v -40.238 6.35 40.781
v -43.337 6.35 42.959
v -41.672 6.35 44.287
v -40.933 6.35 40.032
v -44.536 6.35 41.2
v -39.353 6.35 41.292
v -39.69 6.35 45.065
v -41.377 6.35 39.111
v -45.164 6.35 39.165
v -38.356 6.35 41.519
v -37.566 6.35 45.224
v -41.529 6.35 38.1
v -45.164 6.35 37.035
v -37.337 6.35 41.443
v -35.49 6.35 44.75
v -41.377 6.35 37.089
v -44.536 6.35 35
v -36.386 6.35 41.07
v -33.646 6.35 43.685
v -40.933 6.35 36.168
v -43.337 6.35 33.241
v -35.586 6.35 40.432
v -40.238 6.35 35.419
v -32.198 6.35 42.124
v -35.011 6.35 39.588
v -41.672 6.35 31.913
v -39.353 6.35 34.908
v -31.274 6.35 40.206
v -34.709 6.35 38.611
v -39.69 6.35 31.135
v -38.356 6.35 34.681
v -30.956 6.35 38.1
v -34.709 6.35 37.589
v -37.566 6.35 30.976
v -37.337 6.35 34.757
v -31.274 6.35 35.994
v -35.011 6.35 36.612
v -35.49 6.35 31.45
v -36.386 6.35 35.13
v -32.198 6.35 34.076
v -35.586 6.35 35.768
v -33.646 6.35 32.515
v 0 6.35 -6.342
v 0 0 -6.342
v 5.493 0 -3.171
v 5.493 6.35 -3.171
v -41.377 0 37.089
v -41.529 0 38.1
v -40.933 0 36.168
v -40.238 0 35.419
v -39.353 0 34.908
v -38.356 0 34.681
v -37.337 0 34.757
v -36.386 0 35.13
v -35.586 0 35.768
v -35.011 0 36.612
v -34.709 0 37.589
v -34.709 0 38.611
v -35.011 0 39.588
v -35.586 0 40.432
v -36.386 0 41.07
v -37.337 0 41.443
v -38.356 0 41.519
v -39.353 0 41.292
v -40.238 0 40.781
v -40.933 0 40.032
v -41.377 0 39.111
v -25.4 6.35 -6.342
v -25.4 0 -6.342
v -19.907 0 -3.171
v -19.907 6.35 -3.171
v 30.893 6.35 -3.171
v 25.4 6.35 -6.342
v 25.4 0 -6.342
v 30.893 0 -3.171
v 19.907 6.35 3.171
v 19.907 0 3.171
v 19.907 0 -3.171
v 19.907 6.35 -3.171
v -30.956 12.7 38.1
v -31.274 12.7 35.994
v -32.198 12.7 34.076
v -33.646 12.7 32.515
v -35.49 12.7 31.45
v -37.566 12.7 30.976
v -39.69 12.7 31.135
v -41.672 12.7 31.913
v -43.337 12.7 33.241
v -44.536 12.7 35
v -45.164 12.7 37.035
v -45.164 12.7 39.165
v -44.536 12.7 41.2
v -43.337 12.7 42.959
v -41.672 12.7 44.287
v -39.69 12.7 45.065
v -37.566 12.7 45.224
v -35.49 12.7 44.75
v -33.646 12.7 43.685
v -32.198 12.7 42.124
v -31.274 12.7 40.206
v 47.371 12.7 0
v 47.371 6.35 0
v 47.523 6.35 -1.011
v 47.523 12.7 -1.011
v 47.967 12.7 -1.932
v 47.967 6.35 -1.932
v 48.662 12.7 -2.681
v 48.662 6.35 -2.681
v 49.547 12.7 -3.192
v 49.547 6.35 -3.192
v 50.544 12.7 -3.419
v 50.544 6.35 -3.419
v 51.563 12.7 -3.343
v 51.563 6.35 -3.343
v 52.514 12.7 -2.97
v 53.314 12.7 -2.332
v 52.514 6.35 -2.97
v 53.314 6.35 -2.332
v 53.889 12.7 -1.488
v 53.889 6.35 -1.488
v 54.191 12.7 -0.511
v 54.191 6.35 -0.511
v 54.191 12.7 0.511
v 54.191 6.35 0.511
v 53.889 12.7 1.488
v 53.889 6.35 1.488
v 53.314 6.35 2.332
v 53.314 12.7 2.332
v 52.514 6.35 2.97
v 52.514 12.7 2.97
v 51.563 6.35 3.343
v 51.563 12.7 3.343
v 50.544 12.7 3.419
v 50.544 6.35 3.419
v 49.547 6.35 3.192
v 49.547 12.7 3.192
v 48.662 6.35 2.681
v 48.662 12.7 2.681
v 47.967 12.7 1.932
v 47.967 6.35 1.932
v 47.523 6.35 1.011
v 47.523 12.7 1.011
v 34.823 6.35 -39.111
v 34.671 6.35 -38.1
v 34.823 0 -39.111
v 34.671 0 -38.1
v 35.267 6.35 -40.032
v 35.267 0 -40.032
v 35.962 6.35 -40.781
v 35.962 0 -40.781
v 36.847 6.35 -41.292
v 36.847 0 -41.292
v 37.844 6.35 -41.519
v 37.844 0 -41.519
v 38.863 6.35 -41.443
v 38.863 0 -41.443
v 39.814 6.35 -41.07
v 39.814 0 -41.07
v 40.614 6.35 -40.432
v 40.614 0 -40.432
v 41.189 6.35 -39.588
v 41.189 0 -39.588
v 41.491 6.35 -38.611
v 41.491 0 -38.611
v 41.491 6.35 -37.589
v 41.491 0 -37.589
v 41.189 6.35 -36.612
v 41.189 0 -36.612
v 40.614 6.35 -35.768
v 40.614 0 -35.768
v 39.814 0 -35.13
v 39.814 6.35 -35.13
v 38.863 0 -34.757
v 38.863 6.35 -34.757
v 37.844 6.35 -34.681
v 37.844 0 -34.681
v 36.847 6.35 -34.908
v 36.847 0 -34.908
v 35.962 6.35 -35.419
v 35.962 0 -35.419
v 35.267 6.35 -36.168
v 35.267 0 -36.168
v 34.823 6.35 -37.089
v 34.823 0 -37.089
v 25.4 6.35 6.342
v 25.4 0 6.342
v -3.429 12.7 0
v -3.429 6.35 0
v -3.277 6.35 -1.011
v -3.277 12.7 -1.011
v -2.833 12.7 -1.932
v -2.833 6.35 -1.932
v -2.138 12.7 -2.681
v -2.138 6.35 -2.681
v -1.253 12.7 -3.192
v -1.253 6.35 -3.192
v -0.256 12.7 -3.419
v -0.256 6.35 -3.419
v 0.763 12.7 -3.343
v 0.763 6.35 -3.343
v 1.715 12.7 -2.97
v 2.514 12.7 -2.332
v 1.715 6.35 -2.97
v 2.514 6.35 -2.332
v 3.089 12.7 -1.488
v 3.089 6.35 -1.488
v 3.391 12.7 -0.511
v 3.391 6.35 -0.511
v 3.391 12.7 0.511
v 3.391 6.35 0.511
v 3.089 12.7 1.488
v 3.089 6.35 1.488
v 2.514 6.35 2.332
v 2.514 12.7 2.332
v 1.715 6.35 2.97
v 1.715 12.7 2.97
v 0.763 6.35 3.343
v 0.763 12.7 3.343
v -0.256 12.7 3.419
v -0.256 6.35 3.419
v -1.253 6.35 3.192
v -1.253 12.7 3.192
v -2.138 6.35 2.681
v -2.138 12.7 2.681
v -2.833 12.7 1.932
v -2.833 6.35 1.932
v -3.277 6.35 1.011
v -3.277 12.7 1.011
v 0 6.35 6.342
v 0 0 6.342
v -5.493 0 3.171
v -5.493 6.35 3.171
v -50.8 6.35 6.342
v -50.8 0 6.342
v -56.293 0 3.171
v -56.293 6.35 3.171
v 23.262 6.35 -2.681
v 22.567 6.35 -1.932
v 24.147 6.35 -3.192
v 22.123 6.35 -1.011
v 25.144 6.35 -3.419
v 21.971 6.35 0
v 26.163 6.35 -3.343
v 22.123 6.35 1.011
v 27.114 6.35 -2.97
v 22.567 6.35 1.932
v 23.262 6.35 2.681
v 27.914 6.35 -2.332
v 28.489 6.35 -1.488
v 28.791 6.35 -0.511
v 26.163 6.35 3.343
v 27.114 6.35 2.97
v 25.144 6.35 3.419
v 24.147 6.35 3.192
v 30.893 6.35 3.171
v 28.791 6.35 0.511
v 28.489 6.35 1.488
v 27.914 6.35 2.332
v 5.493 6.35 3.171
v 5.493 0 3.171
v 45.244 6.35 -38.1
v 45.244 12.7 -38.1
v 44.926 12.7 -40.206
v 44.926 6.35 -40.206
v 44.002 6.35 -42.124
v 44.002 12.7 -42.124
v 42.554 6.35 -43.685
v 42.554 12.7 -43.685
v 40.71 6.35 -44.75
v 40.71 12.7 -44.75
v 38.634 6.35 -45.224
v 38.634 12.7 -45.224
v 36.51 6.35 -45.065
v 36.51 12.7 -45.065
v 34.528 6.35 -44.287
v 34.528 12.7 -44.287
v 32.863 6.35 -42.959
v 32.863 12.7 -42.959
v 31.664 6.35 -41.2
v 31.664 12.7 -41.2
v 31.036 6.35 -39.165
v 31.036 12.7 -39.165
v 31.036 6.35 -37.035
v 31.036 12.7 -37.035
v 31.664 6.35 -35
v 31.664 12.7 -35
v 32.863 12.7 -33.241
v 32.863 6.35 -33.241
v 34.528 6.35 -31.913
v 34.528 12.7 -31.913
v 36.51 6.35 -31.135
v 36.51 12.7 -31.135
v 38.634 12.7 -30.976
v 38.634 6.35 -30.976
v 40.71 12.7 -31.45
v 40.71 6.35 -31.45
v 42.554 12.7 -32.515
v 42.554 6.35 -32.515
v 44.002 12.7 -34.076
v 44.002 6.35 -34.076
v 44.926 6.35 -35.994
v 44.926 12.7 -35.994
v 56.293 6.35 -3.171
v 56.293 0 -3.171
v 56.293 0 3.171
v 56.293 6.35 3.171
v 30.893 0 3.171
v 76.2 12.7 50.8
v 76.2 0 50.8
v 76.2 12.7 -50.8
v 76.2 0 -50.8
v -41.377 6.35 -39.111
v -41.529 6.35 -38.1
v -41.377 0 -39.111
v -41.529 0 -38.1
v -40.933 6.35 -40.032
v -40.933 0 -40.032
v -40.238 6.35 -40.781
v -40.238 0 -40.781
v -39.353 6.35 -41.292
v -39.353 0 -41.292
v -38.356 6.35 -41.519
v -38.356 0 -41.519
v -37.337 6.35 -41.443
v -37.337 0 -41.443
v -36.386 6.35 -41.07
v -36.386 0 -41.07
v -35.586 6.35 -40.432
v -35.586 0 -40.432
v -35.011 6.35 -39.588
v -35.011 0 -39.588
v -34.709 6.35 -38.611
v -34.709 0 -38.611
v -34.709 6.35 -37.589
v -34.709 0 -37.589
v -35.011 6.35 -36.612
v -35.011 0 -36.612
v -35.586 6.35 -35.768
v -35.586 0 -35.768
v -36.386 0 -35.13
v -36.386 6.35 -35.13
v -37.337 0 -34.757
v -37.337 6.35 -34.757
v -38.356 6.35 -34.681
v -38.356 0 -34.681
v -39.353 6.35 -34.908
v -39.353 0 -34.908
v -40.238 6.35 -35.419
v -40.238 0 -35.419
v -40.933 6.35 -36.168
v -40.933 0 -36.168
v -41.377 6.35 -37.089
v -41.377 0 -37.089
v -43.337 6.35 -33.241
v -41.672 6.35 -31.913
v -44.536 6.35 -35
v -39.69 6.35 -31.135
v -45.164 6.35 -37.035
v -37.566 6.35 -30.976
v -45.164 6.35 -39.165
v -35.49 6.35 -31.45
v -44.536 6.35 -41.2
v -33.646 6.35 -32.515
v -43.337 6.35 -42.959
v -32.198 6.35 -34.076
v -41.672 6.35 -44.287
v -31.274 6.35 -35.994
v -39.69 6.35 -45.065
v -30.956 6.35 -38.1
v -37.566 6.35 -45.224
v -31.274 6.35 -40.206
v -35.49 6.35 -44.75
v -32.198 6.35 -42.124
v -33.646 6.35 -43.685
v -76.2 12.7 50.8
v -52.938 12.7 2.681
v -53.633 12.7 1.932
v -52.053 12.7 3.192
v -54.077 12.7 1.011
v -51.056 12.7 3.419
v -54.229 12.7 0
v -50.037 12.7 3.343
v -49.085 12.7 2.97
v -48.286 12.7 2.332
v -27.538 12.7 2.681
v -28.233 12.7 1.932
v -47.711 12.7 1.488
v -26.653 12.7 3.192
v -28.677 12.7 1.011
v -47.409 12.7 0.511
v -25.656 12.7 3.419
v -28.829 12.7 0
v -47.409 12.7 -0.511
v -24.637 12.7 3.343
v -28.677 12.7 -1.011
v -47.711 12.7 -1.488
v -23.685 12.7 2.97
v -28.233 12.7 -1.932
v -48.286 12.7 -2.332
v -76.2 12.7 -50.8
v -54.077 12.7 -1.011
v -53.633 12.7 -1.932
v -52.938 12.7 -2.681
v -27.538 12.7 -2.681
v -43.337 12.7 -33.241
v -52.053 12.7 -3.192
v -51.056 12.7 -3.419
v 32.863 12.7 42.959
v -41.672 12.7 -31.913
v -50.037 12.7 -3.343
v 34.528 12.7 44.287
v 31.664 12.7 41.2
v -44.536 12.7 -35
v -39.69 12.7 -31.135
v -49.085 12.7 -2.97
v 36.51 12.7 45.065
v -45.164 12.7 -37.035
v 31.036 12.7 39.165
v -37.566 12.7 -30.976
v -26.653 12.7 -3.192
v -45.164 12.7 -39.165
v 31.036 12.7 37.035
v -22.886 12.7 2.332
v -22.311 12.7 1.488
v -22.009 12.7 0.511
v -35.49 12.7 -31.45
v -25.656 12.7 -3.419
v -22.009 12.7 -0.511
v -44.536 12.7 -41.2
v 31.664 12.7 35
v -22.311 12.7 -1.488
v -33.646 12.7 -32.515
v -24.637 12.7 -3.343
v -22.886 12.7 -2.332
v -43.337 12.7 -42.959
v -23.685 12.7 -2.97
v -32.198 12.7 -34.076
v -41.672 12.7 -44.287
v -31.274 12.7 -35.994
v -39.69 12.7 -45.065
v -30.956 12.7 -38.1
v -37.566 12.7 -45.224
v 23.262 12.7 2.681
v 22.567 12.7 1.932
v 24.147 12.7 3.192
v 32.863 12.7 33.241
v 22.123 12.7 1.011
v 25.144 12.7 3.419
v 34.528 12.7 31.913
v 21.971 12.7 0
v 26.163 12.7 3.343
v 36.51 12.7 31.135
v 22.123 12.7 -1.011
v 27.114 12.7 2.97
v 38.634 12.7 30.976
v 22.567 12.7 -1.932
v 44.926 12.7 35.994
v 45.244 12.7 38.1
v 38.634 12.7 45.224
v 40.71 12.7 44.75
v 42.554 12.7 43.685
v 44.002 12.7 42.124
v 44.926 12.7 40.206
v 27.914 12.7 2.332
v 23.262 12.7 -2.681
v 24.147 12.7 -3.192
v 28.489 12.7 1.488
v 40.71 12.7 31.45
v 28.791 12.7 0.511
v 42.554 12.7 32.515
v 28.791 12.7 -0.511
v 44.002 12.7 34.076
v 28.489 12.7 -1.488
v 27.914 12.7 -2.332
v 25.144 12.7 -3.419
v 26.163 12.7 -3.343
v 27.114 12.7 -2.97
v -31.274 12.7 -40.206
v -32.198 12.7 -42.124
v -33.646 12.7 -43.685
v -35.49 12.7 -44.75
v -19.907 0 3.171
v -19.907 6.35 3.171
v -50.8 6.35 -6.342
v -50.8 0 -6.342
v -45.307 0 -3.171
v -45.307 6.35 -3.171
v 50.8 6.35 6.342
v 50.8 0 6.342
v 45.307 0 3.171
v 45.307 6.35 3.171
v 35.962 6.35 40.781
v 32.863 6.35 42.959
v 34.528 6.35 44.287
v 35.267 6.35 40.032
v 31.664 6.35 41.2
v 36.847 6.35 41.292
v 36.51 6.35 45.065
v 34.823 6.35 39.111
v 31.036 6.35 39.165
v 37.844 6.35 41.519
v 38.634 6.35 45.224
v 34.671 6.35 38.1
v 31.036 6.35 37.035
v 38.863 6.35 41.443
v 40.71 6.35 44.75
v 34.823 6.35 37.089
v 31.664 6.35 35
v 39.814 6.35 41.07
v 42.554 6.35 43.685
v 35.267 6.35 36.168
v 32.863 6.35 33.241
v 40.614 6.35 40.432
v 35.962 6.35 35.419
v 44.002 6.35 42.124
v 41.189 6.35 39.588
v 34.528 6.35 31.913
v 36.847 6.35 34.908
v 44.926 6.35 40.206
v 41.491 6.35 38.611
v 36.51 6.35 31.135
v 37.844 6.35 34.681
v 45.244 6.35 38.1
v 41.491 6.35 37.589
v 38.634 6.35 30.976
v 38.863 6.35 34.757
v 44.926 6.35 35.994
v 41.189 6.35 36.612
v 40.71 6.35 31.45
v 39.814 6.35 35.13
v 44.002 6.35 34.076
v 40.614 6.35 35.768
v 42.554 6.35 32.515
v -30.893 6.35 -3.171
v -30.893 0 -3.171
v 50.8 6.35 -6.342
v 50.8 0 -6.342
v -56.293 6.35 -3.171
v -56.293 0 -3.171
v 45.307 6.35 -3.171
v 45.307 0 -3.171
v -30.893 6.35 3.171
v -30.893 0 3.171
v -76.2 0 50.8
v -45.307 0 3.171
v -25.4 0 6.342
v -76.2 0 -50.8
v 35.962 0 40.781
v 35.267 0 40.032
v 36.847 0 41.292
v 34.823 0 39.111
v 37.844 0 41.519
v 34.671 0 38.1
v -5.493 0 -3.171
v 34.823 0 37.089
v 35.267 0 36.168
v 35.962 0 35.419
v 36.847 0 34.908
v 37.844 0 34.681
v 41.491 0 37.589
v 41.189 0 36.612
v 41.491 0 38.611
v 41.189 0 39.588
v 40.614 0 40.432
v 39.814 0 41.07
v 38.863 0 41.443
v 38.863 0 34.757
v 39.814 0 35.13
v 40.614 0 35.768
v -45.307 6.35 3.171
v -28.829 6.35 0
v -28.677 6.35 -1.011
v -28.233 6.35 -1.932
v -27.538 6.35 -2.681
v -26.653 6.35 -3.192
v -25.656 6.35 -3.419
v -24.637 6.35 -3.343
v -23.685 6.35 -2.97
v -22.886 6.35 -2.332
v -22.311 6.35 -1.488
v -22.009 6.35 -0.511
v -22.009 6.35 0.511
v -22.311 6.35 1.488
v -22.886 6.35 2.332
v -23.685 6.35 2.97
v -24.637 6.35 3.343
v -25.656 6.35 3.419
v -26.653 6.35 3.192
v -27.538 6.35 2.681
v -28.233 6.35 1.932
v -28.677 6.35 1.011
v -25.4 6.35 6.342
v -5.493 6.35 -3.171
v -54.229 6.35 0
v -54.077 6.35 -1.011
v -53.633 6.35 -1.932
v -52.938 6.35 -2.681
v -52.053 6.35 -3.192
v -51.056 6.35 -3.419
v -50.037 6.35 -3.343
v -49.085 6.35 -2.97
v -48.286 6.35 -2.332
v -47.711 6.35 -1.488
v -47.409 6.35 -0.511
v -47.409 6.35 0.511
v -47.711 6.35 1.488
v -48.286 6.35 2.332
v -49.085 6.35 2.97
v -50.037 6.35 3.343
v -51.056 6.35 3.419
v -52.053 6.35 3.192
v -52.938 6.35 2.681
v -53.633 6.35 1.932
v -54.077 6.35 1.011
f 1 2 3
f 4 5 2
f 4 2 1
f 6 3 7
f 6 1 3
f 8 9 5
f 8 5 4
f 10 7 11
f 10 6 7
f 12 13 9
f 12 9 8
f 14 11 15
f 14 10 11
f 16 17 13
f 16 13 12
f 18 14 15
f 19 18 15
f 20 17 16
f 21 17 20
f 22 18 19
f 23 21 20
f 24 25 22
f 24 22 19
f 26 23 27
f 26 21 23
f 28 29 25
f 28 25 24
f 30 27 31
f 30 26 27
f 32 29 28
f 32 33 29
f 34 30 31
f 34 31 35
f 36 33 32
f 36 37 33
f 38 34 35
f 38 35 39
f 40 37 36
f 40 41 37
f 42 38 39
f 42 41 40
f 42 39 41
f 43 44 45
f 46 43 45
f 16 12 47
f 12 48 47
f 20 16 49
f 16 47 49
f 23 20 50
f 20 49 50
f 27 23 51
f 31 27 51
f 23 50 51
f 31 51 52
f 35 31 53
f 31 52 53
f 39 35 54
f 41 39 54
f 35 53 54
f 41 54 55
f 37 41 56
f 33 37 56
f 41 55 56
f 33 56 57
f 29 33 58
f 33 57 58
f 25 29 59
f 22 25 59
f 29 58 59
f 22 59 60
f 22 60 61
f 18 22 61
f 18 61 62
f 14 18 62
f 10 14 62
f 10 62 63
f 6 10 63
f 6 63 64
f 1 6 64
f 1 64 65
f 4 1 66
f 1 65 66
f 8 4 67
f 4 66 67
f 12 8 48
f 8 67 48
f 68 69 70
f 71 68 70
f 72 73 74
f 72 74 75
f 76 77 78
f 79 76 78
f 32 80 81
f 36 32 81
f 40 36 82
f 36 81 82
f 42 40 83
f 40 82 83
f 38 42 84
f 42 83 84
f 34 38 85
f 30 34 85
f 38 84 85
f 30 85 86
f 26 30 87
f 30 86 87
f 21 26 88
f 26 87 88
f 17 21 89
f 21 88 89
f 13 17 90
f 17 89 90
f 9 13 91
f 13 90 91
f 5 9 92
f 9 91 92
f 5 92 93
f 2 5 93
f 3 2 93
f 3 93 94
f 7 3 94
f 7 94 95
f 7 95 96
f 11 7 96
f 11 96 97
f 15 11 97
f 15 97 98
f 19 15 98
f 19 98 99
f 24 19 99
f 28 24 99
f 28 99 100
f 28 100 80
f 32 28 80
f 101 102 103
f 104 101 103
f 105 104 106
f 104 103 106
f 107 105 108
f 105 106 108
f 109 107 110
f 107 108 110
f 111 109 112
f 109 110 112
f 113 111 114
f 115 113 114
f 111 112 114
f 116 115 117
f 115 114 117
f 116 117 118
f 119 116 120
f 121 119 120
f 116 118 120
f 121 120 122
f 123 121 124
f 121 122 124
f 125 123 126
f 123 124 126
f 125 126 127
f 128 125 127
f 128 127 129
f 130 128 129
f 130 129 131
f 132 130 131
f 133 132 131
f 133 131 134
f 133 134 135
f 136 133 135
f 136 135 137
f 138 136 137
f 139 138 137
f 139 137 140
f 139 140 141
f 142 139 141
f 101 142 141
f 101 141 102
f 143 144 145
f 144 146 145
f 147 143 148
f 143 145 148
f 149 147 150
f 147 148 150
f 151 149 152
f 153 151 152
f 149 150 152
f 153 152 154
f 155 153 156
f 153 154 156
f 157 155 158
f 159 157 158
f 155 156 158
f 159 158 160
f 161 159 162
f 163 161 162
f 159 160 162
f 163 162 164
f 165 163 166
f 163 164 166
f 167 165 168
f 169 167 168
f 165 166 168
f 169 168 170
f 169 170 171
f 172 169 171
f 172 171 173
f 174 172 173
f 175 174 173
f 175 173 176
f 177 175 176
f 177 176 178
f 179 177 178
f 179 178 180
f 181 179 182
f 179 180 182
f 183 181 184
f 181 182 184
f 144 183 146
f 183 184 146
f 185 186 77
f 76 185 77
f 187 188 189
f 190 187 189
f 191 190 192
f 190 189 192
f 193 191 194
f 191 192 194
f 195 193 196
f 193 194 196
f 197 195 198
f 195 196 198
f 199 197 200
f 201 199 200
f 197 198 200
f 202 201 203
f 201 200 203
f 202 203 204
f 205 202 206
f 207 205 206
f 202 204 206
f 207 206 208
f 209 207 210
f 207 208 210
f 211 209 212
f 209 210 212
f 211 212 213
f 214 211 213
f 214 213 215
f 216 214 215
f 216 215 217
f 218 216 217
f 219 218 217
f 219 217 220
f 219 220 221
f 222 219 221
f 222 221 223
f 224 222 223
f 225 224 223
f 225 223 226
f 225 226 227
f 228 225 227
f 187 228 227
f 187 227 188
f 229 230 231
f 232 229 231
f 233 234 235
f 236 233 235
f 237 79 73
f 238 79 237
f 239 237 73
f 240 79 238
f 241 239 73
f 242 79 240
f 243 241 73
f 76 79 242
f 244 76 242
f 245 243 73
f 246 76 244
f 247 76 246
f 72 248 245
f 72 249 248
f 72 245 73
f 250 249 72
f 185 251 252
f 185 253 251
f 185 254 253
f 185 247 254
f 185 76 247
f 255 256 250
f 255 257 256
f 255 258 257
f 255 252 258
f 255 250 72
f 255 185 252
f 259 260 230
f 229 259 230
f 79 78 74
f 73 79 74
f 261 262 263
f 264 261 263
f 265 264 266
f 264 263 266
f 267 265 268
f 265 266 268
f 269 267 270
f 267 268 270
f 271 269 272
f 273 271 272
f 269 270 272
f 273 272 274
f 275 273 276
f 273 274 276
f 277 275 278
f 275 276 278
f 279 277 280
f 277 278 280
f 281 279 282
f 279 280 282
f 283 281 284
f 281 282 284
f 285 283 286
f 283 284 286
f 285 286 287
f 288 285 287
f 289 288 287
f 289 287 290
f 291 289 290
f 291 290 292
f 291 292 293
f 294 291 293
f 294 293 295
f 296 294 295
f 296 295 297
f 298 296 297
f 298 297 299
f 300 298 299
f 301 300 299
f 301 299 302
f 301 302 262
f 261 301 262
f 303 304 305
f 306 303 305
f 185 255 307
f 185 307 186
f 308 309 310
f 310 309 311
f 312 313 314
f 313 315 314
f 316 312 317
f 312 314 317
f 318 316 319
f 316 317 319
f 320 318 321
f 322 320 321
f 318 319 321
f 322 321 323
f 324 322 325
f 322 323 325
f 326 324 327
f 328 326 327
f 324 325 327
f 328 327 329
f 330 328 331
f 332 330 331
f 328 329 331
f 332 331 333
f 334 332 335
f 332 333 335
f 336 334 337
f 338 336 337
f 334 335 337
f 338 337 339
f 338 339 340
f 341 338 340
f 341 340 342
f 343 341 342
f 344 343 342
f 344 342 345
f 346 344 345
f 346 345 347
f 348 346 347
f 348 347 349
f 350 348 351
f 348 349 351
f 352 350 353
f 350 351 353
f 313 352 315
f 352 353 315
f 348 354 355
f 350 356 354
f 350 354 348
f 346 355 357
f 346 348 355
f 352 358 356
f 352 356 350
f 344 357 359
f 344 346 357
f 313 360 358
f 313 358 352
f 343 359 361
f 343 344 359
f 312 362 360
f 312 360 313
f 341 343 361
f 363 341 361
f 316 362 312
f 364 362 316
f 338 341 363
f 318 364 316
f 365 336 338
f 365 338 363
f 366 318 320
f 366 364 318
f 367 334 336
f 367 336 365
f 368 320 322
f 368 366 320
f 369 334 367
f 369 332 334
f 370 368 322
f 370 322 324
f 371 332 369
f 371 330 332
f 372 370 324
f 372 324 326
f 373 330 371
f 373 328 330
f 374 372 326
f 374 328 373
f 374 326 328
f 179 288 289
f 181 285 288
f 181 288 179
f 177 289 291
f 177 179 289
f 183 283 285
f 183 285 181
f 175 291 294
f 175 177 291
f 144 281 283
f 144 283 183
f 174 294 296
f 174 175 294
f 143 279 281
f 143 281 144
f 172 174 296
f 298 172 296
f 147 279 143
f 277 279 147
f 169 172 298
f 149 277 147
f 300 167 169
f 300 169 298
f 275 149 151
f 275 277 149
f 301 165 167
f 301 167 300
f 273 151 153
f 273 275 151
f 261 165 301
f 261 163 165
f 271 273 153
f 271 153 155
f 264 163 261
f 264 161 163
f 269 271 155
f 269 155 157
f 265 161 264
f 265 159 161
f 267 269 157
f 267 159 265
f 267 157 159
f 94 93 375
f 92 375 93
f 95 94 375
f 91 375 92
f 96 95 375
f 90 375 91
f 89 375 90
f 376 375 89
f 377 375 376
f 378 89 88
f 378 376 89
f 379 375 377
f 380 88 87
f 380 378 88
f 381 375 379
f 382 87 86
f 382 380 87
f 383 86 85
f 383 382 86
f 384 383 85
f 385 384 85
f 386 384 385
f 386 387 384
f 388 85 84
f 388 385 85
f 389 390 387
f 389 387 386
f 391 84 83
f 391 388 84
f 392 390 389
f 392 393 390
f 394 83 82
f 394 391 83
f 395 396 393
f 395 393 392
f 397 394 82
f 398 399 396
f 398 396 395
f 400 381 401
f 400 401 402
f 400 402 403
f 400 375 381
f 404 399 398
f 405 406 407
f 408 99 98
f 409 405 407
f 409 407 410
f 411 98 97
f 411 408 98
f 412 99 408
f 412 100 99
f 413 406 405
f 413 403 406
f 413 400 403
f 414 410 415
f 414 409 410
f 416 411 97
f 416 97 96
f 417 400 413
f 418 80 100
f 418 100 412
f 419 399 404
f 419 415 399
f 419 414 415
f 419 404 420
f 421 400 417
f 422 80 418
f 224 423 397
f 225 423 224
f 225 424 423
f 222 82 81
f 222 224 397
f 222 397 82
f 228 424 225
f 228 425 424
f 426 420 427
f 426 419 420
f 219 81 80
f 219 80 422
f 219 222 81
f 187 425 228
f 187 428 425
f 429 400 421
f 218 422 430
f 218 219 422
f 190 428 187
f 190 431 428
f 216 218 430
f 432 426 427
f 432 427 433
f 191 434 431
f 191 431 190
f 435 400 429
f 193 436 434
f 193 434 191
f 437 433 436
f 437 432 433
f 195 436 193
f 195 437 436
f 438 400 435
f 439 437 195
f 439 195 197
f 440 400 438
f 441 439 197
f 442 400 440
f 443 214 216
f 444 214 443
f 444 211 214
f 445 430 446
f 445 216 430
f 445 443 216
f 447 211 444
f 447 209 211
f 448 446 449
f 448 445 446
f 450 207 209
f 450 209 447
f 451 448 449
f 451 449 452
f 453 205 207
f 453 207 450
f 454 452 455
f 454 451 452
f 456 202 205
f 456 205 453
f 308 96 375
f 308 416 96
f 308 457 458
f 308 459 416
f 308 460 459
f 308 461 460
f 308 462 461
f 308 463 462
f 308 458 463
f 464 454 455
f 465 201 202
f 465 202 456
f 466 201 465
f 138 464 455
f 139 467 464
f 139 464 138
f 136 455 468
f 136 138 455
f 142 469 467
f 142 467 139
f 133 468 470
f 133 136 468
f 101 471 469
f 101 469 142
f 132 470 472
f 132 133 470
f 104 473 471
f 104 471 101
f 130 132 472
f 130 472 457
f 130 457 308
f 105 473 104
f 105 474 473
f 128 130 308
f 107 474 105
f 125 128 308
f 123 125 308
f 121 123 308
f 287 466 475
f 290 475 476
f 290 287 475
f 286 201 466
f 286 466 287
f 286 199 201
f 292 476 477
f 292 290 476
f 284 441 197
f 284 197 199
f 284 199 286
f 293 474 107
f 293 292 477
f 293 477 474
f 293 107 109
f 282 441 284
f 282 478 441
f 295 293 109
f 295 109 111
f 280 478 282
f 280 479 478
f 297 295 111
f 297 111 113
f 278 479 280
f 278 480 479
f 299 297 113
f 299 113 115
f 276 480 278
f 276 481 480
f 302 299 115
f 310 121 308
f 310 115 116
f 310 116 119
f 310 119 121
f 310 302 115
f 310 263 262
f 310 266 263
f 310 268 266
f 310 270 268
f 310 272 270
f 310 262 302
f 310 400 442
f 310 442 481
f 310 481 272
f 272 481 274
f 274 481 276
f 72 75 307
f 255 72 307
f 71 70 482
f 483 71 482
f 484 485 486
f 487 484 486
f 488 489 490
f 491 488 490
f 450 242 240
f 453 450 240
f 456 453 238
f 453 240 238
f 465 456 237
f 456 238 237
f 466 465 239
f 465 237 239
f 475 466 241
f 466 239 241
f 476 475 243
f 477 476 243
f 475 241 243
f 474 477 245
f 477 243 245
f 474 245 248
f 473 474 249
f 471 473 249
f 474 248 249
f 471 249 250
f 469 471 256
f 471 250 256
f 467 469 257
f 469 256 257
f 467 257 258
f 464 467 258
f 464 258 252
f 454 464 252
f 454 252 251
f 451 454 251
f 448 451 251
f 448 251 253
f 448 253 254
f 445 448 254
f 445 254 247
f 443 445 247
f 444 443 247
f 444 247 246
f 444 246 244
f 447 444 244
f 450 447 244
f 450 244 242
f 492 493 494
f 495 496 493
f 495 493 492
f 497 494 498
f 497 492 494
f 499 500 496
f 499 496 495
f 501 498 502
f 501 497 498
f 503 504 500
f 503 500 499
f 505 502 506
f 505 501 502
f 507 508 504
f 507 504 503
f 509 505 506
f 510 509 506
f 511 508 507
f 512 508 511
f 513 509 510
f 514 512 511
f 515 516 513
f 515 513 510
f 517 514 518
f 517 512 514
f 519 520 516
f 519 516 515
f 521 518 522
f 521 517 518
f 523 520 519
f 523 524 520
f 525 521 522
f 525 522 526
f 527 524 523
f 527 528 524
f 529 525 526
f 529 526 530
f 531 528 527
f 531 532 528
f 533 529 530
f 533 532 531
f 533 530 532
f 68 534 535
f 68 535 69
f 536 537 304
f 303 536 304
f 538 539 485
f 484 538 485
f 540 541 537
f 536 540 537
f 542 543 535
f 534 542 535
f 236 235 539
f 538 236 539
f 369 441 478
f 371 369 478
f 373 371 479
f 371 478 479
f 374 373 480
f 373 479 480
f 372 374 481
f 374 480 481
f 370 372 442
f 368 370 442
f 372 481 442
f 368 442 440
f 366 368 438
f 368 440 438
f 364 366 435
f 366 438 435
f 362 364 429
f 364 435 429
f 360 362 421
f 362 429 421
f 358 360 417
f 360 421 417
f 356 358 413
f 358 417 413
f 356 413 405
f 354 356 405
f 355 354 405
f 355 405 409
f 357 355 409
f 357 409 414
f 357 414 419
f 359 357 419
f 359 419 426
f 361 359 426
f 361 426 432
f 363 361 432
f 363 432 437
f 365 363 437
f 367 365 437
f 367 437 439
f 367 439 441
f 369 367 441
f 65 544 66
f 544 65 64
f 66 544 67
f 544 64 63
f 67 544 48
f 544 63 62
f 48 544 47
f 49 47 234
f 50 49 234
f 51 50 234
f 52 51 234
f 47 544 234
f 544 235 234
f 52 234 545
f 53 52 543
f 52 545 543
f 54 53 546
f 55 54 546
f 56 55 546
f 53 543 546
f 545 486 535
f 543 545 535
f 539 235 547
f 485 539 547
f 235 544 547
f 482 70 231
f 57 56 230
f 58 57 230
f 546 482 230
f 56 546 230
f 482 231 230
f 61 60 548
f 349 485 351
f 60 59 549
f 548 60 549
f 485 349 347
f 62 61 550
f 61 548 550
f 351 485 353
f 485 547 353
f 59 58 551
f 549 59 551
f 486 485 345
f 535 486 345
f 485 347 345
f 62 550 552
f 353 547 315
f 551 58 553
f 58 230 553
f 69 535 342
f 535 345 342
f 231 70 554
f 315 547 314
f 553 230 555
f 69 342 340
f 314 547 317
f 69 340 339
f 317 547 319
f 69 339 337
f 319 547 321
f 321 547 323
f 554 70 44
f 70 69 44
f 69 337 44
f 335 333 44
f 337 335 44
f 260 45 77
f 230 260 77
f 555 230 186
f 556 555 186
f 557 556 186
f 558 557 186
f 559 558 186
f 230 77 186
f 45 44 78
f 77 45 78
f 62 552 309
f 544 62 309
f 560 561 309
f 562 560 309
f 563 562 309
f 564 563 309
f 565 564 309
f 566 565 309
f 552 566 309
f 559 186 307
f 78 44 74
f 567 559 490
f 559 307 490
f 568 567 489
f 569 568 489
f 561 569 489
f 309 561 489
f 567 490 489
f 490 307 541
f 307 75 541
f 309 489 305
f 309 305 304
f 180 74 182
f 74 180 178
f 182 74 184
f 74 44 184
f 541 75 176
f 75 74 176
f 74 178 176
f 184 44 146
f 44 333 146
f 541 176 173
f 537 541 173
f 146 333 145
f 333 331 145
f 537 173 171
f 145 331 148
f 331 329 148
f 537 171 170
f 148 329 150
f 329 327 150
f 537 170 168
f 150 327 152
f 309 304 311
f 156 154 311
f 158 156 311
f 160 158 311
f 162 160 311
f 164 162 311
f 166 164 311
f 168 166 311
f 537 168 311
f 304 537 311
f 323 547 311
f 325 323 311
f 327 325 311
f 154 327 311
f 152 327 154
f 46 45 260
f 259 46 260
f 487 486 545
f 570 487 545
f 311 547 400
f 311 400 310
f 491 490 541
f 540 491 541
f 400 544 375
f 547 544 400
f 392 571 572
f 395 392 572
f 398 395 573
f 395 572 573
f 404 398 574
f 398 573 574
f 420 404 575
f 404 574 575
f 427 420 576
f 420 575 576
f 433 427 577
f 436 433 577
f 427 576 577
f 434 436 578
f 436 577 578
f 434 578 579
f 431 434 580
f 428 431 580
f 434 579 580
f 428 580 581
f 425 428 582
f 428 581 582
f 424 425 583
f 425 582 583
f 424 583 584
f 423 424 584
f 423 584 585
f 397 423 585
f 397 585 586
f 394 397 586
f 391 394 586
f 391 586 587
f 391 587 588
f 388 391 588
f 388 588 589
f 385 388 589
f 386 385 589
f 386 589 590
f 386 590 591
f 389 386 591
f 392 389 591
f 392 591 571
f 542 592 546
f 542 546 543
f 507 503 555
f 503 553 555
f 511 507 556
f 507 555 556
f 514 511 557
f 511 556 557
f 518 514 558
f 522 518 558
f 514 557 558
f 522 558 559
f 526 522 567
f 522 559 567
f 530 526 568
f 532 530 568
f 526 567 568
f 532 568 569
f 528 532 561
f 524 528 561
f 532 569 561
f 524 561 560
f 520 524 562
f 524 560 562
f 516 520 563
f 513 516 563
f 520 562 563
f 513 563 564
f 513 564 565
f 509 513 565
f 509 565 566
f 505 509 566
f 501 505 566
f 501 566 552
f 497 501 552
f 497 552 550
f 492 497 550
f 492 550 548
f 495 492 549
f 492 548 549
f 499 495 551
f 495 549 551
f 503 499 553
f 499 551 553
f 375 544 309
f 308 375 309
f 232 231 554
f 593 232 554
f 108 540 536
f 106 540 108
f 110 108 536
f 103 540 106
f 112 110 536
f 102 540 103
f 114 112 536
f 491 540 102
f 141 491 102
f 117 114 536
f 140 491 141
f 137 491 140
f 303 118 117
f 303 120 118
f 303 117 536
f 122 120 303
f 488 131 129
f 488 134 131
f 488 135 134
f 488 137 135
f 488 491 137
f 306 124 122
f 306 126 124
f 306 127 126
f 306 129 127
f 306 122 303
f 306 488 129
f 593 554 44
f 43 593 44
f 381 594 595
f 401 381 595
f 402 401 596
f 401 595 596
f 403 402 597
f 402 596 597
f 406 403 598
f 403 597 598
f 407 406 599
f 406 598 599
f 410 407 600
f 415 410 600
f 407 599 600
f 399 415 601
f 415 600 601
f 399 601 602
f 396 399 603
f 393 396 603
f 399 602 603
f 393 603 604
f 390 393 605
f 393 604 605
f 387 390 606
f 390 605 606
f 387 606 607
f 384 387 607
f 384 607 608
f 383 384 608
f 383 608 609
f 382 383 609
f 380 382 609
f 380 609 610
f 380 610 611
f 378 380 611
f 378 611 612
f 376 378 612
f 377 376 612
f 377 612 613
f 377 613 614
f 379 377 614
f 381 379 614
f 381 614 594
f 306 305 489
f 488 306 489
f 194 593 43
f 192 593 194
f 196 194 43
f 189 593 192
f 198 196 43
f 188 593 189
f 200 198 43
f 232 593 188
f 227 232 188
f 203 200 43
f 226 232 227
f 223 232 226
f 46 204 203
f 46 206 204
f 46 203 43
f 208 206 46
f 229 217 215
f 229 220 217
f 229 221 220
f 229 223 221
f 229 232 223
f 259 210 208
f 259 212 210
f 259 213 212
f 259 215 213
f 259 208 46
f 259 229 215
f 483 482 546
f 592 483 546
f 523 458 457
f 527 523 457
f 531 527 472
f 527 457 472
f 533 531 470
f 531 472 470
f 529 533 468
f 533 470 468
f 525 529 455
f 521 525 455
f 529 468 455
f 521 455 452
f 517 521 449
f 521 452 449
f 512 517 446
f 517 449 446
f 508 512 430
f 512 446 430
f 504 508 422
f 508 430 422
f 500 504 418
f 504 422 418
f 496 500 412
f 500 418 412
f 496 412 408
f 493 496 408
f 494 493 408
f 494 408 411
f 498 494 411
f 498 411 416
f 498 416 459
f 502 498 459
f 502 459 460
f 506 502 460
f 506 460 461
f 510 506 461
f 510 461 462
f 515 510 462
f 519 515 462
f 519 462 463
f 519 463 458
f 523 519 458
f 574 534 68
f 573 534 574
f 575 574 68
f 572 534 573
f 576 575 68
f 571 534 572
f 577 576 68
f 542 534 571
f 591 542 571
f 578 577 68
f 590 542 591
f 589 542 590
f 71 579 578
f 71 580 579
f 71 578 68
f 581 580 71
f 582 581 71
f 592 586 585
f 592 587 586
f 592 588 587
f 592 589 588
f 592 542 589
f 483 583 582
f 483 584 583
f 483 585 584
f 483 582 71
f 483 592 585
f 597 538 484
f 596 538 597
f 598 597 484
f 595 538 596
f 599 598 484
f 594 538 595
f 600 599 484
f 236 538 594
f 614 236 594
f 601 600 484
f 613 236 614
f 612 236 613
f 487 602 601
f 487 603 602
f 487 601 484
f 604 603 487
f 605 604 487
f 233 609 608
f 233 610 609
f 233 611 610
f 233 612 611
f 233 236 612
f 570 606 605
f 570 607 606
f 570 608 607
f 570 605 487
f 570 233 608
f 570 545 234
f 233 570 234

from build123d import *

# Parameters (mm, degrees)
SKETCH1_W                                            = 152.4
SKETCH1_H                                            = 101.6
BOSS_EXTRUDE1_DEPTH                                  = 12.7
CBORE_FOR_1_4_BINDING_HEAD_MACHINE_SCREW_D           = 6.858
CBORE_FOR_1_4_BINDING_HEAD_MACHINE_SCREW_CBORE_D     = 14.2875
CBORE_FOR_1_4_BINDING_HEAD_MACHINE_SCREW_CBORE_DEPTH = 6.35
F_1_4_0_25_DIAMETER_HOLE1_D                          = 6.858
CUT_EXTRUDE1_DEPTH                                   = 6.35


with BuildPart() as part:
    # Sketch1 → Boss-Extrude1 (new body)
    with BuildSketch(Plane(origin=(0, 0, 0), x_dir=(1, 0, 0), z_dir=(0, 1, 0))):
        Rectangle(SKETCH1_W, SKETCH1_H)
    extrude(amount=BOSS_EXTRUDE1_DEPTH)

    # CBORE for 1/4 Binding Head Machine Screw1 (through all)
    with Locations(Plane(origin=(0, 12.7, 0), x_dir=(1, 0, 0), z_dir=(0, 1, 0))):
        with Locations((-38.1, 38.1), (38.1, 38.1), (38.1, -38.1), (-38.1, -38.1)):
            CounterBoreHole(CBORE_FOR_1_4_BINDING_HEAD_MACHINE_SCREW_D / 2, CBORE_FOR_1_4_BINDING_HEAD_MACHINE_SCREW_CBORE_D / 2, CBORE_FOR_1_4_BINDING_HEAD_MACHINE_SCREW_CBORE_DEPTH)

    # 1/4 (0.25) Diameter Hole1 (through all)
    with Locations(Plane(origin=(0, 12.7, 0), x_dir=(1, 0, 0), z_dir=(0, 1, 0))):
        with Locations((0, 0), (25.4, 0), (50.8, 0), (-25.4, 0), (-50.8, 0)):
            Hole(F_1_4_0_25_DIAMETER_HOLE1_D / 2)

    # Sketch6 → Cut-Extrude1 (cut)
    with BuildSketch(Plane.XZ):
        Polygon((19.90725, -3.171240691), (25.4, -6.342481382), (30.89275, -3.171240691), (30.89275, 3.171240691), (25.4, 6.342481382), (19.90725, 3.171240691), align=None)
        Polygon((50.8, 6.342481382), (45.30725, 3.171240691), (45.30725, -3.171240691), (50.8, -6.342481382), (56.29275, -3.171240691), (56.29275, 3.171240691), align=None)
        Polygon((-5.49275, -3.171240691), (0, -6.342481382), (5.49275, -3.171240691), (5.49275, 3.171240691), (0, 6.342481382), (-5.49275, 3.171240691), align=None)
        Polygon((-30.89275, -3.171240691), (-25.4, -6.342481382), (-19.90725, -3.171240691), (-19.90725, 3.171240691), (-25.4, 6.342481382), (-30.89275, 3.171240691), align=None)
        Polygon((-56.29275, -3.171240691), (-50.8, -6.342481382), (-45.30725, -3.171240691), (-45.30725, 3.171240691), (-50.8, 6.342481382), (-56.29275, 3.171240691), align=None)
    extrude(amount=-CUT_EXTRUDE1_DEPTH, mode=Mode.SUBTRACT)


solid = part.part
